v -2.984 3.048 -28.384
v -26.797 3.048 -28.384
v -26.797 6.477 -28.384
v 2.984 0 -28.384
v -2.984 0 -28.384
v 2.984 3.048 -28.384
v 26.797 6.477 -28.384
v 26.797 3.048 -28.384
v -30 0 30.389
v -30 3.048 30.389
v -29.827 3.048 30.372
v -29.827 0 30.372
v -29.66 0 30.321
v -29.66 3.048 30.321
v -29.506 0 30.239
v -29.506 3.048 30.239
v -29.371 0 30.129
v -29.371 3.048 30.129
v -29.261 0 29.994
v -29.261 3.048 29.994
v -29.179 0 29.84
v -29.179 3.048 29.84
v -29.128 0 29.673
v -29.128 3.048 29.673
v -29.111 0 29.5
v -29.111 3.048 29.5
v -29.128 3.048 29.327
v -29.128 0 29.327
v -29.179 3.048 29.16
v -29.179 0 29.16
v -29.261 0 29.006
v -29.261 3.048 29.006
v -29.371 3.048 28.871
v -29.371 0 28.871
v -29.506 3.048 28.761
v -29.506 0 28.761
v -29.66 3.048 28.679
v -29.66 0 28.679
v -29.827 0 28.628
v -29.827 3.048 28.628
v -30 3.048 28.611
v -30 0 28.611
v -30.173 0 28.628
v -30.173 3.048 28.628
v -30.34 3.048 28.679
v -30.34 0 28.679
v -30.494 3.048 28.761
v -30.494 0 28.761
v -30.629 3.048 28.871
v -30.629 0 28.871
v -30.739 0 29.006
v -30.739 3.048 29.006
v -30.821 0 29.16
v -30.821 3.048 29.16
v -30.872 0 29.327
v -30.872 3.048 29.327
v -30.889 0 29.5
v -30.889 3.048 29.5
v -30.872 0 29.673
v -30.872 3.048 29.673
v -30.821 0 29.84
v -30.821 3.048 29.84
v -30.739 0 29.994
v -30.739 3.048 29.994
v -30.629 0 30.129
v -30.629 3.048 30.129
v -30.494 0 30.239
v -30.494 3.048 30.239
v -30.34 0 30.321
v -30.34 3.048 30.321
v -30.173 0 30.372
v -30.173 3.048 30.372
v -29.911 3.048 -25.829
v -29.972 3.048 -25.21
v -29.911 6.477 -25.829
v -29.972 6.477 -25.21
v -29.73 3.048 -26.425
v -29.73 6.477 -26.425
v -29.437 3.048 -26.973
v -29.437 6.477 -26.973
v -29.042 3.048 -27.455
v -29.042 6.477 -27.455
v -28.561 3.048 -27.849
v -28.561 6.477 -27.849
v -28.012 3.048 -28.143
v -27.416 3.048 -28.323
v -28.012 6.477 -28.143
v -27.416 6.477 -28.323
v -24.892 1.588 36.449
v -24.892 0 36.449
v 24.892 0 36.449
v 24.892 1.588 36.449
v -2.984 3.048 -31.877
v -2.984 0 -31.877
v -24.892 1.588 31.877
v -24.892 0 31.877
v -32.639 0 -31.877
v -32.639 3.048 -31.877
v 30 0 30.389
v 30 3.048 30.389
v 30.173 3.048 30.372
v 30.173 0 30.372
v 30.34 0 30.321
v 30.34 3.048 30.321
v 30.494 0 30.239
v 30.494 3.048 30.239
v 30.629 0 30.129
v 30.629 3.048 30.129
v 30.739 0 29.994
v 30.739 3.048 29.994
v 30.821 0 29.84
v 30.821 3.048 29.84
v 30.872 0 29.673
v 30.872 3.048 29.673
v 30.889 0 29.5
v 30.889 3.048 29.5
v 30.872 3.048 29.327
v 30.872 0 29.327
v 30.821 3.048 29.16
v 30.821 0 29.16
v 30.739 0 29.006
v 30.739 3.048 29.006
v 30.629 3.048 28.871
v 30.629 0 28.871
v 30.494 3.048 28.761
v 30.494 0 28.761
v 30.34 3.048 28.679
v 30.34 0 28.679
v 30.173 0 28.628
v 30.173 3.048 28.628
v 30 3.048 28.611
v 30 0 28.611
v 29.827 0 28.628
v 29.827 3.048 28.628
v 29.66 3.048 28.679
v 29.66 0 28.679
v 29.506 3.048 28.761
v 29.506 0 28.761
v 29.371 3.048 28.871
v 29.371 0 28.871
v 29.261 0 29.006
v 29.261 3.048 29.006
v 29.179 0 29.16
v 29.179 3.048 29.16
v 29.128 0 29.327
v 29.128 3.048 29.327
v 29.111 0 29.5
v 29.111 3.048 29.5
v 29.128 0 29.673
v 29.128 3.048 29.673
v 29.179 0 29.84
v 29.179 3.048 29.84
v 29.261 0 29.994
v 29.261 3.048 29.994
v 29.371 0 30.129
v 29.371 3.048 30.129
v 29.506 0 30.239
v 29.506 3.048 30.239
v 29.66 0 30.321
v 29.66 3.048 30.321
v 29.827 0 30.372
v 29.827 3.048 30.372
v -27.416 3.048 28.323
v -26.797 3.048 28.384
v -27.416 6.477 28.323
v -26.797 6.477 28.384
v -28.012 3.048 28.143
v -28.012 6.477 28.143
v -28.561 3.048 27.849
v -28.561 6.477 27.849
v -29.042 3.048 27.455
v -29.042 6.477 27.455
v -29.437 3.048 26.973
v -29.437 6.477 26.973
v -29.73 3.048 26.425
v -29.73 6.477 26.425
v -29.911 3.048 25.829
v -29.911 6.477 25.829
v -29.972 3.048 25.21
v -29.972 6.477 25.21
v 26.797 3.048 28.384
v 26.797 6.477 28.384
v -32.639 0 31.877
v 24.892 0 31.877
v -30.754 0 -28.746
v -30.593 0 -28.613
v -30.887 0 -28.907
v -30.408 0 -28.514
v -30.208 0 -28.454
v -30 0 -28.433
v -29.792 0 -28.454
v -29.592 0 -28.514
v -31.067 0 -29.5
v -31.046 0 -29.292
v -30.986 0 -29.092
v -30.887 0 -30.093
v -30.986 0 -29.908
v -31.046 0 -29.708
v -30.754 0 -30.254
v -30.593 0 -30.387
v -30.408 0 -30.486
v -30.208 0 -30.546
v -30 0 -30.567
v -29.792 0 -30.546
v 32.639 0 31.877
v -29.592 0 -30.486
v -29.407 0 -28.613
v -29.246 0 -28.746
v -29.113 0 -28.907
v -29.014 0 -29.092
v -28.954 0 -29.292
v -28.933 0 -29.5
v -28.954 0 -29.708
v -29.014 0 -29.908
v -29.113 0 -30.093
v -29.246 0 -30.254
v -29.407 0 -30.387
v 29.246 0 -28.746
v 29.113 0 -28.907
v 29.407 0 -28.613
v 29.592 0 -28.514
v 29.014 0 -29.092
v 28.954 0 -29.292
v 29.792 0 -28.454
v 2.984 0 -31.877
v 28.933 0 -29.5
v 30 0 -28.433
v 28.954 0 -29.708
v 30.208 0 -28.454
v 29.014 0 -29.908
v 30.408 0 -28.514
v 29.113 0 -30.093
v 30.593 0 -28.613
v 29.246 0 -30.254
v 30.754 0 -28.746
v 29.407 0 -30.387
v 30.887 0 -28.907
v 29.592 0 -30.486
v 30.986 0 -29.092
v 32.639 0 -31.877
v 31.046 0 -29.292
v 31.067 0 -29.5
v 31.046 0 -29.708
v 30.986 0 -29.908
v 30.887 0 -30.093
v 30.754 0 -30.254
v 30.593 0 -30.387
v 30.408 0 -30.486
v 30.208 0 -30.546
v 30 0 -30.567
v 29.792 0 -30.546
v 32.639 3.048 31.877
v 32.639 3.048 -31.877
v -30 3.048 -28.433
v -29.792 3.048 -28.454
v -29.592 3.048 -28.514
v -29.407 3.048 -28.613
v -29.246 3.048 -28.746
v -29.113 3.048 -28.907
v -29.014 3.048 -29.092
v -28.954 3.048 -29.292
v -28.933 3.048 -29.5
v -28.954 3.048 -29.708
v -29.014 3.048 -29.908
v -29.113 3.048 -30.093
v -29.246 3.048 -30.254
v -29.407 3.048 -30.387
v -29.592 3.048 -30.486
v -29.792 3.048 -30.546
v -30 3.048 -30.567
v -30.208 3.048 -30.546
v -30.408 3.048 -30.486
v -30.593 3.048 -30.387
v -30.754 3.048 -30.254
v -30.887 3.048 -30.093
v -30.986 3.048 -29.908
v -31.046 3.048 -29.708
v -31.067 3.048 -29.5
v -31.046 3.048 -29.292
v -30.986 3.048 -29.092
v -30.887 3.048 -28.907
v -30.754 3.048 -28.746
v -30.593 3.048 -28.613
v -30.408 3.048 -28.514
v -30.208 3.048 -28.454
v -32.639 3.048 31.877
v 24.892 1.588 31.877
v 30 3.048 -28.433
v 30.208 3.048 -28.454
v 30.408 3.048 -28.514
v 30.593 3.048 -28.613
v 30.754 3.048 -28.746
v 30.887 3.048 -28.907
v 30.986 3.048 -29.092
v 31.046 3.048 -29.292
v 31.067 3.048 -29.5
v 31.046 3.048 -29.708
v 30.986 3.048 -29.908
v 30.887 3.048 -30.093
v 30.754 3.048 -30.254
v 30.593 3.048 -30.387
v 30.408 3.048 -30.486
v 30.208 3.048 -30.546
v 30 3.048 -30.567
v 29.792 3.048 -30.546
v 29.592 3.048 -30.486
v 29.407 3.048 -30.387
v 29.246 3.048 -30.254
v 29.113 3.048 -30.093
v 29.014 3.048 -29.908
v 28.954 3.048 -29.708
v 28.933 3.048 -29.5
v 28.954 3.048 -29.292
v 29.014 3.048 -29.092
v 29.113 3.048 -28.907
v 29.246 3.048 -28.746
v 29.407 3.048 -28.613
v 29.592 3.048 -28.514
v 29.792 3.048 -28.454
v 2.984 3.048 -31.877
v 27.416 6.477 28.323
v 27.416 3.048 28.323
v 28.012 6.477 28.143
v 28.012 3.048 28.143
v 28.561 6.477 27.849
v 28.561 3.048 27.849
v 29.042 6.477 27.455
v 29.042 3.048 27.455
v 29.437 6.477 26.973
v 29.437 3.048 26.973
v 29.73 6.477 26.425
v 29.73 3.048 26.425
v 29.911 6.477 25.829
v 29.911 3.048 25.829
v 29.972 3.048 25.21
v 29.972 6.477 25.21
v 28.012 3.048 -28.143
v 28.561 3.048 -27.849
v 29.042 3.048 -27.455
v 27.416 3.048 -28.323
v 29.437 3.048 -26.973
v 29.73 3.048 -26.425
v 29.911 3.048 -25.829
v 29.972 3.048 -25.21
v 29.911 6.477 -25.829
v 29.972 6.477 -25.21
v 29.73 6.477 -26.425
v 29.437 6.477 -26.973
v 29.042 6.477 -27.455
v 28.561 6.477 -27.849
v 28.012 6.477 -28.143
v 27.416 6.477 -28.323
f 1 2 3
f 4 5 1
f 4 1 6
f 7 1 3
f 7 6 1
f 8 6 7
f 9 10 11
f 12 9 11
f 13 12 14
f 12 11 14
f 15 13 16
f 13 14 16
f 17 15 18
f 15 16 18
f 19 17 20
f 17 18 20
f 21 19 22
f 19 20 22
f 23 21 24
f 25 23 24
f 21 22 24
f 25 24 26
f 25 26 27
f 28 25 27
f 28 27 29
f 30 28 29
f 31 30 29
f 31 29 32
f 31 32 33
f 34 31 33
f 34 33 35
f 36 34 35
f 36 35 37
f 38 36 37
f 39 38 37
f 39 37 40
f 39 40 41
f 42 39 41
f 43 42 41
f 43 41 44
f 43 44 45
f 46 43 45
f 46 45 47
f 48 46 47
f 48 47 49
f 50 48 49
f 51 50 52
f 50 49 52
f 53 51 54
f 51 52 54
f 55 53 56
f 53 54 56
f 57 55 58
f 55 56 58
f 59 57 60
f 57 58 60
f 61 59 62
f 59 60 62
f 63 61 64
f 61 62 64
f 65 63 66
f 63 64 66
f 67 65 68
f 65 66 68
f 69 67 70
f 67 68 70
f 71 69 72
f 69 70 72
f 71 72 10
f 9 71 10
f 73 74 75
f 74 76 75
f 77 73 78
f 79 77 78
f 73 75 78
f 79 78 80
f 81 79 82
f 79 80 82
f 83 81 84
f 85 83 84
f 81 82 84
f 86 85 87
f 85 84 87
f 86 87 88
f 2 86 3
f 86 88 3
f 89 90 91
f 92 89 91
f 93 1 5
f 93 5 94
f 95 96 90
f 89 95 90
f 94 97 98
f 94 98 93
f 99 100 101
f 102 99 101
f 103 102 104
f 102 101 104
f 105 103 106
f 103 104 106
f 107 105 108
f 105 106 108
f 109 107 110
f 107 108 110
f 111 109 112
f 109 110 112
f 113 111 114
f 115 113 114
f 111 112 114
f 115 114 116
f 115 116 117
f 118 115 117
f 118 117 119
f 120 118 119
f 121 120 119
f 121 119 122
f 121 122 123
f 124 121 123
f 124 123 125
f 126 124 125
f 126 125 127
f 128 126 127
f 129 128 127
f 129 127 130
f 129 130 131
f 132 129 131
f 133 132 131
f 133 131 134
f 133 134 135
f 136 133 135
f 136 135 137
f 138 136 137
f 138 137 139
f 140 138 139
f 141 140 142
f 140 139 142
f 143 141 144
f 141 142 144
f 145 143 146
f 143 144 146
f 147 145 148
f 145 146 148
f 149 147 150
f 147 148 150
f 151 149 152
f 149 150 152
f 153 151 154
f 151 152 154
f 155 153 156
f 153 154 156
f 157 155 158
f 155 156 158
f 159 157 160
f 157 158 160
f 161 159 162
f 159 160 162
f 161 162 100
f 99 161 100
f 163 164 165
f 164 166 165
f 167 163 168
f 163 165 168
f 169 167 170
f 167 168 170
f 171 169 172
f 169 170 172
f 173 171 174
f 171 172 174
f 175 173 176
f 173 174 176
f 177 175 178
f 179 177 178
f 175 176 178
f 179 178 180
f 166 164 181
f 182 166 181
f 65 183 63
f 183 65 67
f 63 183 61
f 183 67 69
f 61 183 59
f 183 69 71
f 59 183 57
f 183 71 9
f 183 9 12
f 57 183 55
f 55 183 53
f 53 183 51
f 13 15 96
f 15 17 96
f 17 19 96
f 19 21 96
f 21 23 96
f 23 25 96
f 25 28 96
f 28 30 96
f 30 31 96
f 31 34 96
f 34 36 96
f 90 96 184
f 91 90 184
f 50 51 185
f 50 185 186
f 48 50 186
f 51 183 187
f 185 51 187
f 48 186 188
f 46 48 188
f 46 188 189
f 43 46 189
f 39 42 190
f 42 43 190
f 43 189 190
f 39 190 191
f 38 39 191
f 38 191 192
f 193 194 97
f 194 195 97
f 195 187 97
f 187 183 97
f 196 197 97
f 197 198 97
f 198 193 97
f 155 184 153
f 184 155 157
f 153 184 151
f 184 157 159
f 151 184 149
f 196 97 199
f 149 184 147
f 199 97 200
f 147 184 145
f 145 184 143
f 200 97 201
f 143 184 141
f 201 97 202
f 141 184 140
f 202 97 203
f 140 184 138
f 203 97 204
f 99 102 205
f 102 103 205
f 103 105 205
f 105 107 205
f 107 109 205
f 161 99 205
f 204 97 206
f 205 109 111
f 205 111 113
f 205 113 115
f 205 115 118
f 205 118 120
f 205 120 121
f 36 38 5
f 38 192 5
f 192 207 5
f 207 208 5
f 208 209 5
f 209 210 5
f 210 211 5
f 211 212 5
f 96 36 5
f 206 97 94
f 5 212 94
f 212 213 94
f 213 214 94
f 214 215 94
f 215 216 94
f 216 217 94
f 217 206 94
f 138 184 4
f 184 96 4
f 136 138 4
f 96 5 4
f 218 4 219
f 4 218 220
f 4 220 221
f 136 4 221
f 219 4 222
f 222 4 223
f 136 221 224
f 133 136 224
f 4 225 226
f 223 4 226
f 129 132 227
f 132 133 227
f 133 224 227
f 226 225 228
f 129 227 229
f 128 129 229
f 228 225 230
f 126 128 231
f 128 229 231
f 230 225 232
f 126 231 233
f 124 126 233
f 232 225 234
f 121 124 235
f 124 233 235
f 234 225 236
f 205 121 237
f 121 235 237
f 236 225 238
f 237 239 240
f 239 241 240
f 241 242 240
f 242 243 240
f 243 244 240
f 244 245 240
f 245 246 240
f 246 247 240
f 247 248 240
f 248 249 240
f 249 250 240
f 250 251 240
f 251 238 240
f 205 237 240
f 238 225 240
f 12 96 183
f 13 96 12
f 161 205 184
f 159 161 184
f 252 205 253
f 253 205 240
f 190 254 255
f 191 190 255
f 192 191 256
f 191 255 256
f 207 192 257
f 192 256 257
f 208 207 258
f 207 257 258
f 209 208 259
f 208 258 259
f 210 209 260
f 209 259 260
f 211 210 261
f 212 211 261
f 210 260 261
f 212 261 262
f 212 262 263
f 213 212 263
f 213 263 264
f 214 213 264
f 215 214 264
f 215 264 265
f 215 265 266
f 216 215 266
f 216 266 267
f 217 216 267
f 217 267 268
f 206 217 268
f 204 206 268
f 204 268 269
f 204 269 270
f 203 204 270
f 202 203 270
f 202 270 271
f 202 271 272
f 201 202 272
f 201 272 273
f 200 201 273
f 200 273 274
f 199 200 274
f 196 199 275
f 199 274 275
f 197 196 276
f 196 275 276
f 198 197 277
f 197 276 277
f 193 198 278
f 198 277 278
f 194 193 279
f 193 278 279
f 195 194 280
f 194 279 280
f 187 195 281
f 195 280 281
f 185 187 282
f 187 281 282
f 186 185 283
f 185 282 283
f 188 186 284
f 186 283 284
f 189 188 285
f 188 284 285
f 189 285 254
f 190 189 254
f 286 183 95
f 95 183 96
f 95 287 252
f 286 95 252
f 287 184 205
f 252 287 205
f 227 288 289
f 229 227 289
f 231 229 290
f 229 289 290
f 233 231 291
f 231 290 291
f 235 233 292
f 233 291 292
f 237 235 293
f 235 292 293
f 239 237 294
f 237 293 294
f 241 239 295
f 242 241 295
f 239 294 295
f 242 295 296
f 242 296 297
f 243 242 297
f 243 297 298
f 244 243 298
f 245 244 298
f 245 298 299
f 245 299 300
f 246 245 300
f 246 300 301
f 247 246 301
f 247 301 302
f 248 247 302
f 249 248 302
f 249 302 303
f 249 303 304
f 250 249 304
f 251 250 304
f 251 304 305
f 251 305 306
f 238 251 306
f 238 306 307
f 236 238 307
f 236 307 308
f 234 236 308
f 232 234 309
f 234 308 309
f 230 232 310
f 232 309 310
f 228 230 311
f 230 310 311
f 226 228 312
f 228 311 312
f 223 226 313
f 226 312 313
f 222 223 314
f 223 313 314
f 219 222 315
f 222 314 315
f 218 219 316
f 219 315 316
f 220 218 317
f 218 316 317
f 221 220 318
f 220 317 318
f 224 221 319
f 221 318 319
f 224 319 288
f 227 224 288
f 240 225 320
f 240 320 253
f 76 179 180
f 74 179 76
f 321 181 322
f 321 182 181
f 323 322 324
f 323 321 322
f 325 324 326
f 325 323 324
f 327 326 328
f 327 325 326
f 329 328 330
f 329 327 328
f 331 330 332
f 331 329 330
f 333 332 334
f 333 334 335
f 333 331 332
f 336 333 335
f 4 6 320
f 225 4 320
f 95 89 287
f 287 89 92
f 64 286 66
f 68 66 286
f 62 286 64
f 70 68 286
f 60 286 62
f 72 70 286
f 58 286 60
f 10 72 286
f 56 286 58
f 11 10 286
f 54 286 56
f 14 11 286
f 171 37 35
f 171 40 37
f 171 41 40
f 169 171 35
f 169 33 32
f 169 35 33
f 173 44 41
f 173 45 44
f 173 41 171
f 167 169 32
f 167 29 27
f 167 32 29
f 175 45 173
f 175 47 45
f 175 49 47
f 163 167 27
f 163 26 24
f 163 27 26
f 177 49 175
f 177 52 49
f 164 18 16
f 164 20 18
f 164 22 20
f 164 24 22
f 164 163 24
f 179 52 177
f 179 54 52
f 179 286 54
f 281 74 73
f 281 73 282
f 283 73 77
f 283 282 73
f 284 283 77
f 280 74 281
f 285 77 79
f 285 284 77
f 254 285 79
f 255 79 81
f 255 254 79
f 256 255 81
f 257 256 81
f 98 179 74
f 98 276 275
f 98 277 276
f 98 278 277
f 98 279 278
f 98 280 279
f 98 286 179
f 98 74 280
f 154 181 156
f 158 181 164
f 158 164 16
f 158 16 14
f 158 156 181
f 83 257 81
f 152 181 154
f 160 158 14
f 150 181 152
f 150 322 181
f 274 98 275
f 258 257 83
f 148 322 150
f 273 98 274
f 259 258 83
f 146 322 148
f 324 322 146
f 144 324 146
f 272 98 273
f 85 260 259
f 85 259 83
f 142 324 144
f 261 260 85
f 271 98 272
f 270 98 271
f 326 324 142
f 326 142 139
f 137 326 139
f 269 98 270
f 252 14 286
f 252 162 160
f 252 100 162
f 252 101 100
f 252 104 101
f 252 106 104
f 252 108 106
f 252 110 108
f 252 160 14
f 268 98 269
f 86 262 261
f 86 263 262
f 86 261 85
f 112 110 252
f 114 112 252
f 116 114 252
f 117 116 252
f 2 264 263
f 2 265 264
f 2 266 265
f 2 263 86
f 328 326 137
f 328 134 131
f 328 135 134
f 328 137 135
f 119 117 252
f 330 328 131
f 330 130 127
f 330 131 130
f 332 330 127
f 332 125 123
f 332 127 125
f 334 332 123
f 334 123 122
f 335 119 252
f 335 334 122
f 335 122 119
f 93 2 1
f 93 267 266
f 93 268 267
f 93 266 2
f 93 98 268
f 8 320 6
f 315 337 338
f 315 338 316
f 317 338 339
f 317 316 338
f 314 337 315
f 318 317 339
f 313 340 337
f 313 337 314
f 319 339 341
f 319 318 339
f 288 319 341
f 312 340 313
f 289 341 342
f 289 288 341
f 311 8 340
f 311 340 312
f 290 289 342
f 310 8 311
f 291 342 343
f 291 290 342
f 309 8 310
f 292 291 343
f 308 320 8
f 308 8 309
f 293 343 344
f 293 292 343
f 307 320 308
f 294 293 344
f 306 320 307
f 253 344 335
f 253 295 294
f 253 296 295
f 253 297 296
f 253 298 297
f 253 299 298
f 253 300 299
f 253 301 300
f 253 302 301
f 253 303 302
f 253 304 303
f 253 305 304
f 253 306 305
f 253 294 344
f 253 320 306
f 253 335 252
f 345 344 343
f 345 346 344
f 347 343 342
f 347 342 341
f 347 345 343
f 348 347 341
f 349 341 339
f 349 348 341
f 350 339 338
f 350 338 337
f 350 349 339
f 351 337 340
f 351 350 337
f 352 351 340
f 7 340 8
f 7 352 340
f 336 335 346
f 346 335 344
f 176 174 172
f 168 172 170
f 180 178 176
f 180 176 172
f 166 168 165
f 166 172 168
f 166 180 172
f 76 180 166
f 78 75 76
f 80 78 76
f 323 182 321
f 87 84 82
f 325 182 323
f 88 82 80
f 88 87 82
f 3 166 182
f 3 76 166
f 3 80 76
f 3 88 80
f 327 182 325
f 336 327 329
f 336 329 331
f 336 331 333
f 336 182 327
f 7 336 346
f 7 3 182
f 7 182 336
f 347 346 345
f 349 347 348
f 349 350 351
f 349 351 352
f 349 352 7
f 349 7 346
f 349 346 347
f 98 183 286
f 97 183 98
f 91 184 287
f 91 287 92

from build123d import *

# Parameters (mm, degrees)
SKETCH1_W           = 65.278
SKETCH1_H           = 63.754
BOSS_EXTRUDE1_DEPTH = 3.048
SKETCH2_W           = 59.944
SKETCH2_H           = 56.769
BOSS_EXTRUDE2_DEPTH = 3.429
SKETCH3_R           = 1.0668
SKETCH3_R_2         = 0.889
CUT_EXTRUDE1_DEPTH  = 46.751562716
FILLET1_R           = 3.175
SKETCH4_W           = 5.969
SKETCH4_H           = 3.4925
CUT_EXTRUDE2_DEPTH  = 46.751562716
SKETCH5_W           = 49.784
SKETCH5_H           = 4.572
BOSS_EXTRUDE3_DEPTH = 1.5875


with BuildPart() as part:
    # Sketch1 → Boss-Extrude1 (new body)
    with BuildSketch(Plane(origin=(0, 0, 0), x_dir=(1, 0, 0), z_dir=(0, 1, 0))):
        Rectangle(SKETCH1_W, SKETCH1_H)
    extrude(amount=BOSS_EXTRUDE1_DEPTH)

    # Sketch2 → Boss-Extrude2 (add)
    with BuildSketch(Plane(origin=(0, 3.048, 0), x_dir=(1, 0, 0), z_dir=(0, 1, 0))):
        Rectangle(SKETCH2_W, SKETCH2_H)
    extrude(amount=BOSS_EXTRUDE2_DEPTH)

    # Sketch3 → Cut-Extrude1 (cut, through all)
    with BuildSketch(Plane(origin=(0, 3.048, 0), x_dir=(1, 0, 0), z_dir=(0, 1, 0))):
        with Locations(Location((-30, 29.5, 0), (0, 0, 270))):
            Circle(SKETCH3_R)
        with Locations(Location((30, 29.5, 0), (0, 0, 270))):
            Circle(SKETCH3_R)
        with Locations(Location((30, -29.5, 0), (0, 0, 270))):
            Circle(SKETCH3_R_2)
        with Locations(Location((-30, -29.5, 0), (0, 0, 270))):
            Circle(SKETCH3_R_2)
    extrude(amount=-CUT_EXTRUDE1_DEPTH, mode=Mode.SUBTRACT)

    # Fillet1
    fillet1_edges = [part.edges().sort_by_distance(p)[0] for p in [
        (29.972, 4.7625, 28.3845),
        (29.972, 4.7625, -28.3845),
        (-29.972, 4.7625, -28.3845),
        (-29.972, 4.7625, 28.3845),
    ]]
    fillet(fillet1_edges, radius=FILLET1_R)

    # Sketch4 → Cut-Extrude2 (cut, through all)
    with BuildSketch(Plane(origin=(0, 3.048, 0), x_dir=(1, 0, 0), z_dir=(0, 1, 0))):
        with Locations((0, 30.13075)):
            Rectangle(SKETCH4_W, SKETCH4_H)
    extrude(amount=-CUT_EXTRUDE2_DEPTH, mode=Mode.SUBTRACT)

    # Sketch5 → Boss-Extrude3 (add)
    with BuildSketch(Plane.XZ):
        with Locations((0, 34.163)):
            Rectangle(SKETCH5_W, SKETCH5_H)
    extrude(amount=-BOSS_EXTRUDE3_DEPTH)


solid = part.part
